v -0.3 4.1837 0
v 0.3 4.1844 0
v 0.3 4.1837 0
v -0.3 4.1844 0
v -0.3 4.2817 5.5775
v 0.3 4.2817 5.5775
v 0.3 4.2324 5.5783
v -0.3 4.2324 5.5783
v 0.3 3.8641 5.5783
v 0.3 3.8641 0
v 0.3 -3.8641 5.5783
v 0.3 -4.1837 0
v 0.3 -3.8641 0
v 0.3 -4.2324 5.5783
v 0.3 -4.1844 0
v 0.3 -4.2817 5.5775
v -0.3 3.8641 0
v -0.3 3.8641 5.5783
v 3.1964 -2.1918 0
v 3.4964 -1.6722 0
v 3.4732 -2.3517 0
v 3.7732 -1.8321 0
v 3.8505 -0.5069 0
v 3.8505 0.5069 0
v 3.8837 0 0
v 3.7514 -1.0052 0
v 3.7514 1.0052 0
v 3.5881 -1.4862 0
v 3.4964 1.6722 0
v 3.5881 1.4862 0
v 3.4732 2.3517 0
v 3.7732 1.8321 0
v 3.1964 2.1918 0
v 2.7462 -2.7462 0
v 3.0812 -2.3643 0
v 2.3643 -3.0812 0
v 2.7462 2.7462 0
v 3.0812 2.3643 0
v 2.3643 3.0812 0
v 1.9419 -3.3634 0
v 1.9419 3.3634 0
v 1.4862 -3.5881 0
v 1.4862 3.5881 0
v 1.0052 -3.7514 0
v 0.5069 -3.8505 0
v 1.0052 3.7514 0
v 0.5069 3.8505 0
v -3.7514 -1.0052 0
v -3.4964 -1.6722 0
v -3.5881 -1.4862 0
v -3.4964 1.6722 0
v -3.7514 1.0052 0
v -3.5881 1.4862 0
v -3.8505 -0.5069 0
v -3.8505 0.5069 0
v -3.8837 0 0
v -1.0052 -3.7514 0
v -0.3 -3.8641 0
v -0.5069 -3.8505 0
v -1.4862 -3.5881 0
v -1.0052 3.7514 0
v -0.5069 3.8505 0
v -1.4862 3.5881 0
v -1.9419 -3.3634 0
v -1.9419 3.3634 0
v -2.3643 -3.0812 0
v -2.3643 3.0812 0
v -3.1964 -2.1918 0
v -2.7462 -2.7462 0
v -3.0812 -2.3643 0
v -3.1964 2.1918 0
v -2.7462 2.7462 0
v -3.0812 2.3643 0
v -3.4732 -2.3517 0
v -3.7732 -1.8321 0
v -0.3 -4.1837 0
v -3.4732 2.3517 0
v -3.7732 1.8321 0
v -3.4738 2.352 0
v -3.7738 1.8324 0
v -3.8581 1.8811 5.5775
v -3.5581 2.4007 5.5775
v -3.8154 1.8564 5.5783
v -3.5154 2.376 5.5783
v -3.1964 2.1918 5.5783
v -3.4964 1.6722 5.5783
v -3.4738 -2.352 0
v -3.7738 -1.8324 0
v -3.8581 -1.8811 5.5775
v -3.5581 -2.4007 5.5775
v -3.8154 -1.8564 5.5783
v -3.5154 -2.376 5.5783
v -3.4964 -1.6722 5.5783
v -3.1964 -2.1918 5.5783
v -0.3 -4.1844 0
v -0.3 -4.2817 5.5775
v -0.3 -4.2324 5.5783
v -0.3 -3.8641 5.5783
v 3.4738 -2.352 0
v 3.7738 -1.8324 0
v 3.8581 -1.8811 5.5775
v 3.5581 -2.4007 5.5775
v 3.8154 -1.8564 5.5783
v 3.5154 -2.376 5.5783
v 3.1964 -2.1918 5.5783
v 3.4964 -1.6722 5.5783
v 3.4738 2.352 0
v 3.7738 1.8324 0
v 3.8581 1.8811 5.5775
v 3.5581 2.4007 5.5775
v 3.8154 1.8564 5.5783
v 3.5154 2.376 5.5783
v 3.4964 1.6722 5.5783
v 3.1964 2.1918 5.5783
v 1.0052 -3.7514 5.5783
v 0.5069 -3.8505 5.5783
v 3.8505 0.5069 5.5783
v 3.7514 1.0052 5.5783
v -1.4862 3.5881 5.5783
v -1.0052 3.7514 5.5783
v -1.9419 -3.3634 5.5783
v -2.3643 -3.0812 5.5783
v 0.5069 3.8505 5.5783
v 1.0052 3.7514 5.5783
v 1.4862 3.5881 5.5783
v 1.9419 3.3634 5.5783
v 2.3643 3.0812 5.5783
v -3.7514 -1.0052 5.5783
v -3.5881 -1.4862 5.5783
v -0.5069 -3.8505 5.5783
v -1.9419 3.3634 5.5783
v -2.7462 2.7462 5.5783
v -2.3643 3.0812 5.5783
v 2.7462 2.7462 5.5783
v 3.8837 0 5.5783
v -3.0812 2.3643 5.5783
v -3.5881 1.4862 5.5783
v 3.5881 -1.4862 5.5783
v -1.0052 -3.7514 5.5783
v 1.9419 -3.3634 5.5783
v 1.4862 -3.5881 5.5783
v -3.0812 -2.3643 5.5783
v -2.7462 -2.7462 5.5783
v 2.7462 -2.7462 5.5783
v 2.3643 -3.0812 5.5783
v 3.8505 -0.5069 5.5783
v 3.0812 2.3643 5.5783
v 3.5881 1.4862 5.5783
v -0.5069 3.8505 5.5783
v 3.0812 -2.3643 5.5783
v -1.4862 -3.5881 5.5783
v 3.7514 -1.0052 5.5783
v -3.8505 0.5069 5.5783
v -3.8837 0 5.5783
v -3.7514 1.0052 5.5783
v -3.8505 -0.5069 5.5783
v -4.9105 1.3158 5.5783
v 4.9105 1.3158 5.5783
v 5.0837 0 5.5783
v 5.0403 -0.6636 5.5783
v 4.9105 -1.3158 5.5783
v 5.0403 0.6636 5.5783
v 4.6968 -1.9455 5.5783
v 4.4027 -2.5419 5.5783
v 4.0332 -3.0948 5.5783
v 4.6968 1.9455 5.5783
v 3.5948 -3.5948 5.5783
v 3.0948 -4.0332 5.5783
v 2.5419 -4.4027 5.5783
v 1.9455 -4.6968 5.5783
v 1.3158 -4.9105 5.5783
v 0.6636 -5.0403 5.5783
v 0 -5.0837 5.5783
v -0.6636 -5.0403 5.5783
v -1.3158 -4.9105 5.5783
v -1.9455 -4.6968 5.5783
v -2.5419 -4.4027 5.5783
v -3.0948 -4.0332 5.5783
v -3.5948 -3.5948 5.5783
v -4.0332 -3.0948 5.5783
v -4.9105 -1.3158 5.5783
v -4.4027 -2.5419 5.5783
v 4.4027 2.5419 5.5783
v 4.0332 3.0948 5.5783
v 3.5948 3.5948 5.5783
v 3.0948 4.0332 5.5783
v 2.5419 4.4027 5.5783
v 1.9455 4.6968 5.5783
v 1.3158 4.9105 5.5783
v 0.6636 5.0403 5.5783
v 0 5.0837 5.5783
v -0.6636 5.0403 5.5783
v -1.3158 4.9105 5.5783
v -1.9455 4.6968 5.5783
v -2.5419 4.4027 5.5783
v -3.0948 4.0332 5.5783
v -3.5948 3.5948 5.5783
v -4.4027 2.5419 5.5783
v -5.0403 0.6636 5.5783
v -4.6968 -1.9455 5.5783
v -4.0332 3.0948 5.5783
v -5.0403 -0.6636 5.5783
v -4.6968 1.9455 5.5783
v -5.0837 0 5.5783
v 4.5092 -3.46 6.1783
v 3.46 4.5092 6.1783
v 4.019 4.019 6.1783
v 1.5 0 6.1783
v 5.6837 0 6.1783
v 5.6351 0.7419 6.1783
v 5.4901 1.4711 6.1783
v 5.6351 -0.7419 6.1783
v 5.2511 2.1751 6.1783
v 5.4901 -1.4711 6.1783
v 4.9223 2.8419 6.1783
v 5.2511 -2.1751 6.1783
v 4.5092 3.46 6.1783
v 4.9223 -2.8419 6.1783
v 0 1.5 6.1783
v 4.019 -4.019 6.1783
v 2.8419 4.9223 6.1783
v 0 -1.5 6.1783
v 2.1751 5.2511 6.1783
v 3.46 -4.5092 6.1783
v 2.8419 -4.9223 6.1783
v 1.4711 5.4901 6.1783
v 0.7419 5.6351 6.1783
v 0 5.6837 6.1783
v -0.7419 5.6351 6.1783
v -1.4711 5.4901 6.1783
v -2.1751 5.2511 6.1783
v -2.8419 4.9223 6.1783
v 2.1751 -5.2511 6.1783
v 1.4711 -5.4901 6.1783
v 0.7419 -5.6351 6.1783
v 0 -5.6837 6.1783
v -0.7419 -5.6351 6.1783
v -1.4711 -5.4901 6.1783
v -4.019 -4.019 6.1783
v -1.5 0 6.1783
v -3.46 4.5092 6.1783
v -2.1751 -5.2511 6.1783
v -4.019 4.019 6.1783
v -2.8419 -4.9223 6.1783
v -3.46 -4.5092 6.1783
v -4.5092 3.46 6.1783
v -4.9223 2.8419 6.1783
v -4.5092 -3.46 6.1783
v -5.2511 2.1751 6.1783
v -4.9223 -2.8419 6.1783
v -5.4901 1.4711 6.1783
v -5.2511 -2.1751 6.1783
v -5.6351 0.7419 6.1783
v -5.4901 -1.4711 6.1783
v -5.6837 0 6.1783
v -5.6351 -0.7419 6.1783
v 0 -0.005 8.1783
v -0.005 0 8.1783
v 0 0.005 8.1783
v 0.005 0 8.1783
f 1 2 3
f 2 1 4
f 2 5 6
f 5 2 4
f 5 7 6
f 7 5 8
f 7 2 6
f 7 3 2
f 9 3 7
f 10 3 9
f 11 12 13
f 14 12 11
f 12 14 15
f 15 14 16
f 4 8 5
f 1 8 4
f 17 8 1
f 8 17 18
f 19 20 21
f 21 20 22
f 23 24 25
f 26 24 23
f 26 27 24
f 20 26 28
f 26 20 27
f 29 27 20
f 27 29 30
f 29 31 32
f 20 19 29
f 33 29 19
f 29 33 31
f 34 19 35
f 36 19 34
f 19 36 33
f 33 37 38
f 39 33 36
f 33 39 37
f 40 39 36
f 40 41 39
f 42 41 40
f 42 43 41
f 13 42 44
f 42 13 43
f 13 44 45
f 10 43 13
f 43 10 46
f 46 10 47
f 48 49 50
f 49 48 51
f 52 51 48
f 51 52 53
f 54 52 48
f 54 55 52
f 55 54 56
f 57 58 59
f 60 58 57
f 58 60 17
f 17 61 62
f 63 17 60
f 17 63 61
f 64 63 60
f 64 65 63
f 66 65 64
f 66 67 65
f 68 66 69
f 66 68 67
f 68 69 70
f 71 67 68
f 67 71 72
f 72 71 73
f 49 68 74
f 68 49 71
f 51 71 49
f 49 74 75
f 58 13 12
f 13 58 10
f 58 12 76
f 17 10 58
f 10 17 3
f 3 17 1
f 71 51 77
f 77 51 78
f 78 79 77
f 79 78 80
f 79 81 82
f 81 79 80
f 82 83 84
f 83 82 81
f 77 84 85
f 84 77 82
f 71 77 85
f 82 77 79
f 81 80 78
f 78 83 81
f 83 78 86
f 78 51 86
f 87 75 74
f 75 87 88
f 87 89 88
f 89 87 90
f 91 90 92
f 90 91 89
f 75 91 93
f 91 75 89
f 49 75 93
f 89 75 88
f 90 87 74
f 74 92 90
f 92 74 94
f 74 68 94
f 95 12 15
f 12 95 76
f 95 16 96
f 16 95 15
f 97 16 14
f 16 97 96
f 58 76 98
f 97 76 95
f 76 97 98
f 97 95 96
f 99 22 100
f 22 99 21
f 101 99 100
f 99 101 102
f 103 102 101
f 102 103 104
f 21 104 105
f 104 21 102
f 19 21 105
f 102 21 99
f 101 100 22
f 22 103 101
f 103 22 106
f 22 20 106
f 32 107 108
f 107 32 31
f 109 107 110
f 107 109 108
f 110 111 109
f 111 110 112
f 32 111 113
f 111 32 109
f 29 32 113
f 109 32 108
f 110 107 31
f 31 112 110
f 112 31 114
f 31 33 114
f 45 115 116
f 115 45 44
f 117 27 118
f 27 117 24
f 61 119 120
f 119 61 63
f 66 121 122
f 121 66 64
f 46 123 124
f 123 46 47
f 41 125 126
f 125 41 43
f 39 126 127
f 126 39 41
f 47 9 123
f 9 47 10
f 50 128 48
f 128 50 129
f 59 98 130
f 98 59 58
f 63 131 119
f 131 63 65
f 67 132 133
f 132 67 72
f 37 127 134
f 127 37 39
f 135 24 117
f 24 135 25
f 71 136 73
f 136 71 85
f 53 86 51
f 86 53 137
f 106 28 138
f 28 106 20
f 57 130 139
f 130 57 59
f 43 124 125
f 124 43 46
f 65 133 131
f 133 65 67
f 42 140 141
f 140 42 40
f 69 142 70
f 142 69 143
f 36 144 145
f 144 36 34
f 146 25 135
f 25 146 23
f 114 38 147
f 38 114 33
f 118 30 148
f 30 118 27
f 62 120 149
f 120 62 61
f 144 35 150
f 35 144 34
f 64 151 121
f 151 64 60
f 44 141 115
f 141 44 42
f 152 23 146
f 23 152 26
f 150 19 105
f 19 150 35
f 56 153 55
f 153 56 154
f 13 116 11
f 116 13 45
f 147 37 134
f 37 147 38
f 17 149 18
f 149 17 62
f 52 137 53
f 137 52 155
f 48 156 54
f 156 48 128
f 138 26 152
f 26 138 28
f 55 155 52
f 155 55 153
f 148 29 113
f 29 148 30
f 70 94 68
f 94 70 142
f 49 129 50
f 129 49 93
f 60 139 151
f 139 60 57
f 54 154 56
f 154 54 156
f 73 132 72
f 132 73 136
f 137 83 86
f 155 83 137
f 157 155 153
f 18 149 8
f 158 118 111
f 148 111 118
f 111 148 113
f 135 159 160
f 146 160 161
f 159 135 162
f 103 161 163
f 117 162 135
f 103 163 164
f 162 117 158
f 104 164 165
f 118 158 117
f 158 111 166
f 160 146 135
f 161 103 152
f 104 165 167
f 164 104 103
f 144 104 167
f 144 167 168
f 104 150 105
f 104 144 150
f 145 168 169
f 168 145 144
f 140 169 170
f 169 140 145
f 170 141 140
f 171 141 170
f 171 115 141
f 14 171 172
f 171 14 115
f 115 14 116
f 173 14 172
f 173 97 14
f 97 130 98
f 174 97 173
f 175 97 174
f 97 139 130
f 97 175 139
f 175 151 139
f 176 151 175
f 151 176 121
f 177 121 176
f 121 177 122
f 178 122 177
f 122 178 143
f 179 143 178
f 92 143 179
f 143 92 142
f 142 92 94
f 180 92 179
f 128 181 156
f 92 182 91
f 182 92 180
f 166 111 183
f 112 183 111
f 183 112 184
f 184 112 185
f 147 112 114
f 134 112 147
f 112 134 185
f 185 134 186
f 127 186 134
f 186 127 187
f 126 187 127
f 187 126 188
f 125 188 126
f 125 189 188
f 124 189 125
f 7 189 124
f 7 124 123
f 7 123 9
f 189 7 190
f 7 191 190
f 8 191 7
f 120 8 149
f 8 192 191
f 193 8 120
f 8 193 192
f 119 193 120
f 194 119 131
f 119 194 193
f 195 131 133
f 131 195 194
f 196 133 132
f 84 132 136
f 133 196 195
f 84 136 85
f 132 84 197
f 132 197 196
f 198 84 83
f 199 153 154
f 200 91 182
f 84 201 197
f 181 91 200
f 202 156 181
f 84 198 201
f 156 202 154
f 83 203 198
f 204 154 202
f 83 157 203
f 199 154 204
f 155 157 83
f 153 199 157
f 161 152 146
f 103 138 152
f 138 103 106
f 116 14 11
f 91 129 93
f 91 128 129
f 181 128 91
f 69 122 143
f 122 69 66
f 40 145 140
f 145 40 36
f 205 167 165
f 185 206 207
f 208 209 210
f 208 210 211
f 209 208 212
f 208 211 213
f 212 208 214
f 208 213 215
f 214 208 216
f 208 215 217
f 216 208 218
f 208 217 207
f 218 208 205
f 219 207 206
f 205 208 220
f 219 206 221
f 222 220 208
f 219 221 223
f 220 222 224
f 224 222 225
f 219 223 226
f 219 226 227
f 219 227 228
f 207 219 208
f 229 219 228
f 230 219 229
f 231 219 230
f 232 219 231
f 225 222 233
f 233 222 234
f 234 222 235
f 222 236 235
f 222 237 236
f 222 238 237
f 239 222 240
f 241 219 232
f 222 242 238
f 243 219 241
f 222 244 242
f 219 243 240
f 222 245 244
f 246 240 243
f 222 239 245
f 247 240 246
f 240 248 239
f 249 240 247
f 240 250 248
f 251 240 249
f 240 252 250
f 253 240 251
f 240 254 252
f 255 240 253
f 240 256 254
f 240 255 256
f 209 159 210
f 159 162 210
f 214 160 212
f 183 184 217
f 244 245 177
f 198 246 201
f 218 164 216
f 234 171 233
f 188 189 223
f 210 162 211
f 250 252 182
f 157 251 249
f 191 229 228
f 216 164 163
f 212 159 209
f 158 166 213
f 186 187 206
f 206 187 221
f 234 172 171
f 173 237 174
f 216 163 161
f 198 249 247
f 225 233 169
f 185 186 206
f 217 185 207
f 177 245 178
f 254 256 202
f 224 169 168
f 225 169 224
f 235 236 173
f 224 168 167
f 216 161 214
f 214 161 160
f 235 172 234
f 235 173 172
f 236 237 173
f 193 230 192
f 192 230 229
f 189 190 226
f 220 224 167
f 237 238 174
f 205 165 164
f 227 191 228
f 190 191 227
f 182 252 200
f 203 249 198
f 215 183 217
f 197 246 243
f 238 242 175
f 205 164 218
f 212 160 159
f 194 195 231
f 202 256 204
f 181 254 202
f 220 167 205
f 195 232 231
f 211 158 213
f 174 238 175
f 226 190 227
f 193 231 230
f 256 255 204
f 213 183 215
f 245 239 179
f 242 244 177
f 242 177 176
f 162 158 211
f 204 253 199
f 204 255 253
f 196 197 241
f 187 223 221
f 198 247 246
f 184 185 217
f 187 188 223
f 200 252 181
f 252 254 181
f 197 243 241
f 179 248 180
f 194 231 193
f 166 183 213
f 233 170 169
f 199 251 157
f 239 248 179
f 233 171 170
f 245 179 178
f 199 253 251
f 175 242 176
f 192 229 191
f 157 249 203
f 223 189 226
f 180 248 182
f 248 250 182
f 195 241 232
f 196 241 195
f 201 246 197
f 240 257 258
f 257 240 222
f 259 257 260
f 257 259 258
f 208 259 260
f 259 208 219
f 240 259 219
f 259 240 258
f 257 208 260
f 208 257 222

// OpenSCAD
// This allows you to make customized dowel centers.
// USAGE: When assembling a wood project with dowels, drill the hole on
// one piece, then insert these.  Press the mating piece together and
// it will give you perfectly-aligned marks for drilling the other side.
//
// Licensed under CreativeCommons-Attribution-ShareAlike
// To fulfil the attribution requirement, please provide a link to:
//		http://www.thingiverse.com/thing:927256

/* [main] */

// The units used for the rest of this page
dowel_units=0; // [0:Inches,1:mm]

dowel_dia=0.3125;

// if =0, will do a best guess
dowel_depth=0;

/* [advanced stuff you probably shouldn't mess with] */

// Magic number to account for drill wobble, etc.
hole_dia_oversize=0.43;

// How deep in mm the anti-friction ribs are.
rib_min_thickness=0.3;

// Thickness in mm of the anti-friction ribs
rib_thickness=0.6;

// How many anti-friction ribs
num_ribs=6;

// How many degrees the anti-friction ribs tilt out (to wedge tightly into the hole)
rib_angle=1;

// How many sides the point has
point_sides=4;

// How big around the point is
point_radius=1.5;

// How tall the point is.  If <0, then it will be 1 1/3 the point_radius
point_height=0;

// How far the rim overhangs (too high could cause printability issues)
rim_overhang=1.5;

rim_thickness=0.6;

// resolution
fn=48;

/* [hidden] */
r=((dowel_units==0?dowel_dia*25.4:dowel_dia)+hole_dia_oversize)/2;
ir=r-rib_min_thickness;
h=dowel_depth<=0?r*4/3:(dowel_units==0?dowel_depth*25.4:dowel_depth);
overhang_r=r+rim_overhang;
point_r=min(point_radius,r*2/3);
point_h=point_height<=0?point_r*4/3:point_height;

cylinder(r=ir,h=h,$fn=fn);
for(a=[0:360/num_ribs:359.99]){
	rotate([0,0,a]) union(){
		rotate([-rib_angle,0,0]) translate([-rib_thickness/2,0,r*sin(rib_angle)]) cube([rib_thickness,r,h]);
		translate([-rib_thickness/2,0,0]) cube([rib_thickness,r,h]); // to prevent a gap at the bottom
	}
}
translate([0,0,h]) cylinder(r2=overhang_r,r1=overhang_r-rim_thickness,h=rim_thickness,$fn=fn);// overhang
translate([0,0,h+rim_thickness]) cylinder(r1=point_r,r2=0.005,h=point_h,$fn=point_sides);// point
